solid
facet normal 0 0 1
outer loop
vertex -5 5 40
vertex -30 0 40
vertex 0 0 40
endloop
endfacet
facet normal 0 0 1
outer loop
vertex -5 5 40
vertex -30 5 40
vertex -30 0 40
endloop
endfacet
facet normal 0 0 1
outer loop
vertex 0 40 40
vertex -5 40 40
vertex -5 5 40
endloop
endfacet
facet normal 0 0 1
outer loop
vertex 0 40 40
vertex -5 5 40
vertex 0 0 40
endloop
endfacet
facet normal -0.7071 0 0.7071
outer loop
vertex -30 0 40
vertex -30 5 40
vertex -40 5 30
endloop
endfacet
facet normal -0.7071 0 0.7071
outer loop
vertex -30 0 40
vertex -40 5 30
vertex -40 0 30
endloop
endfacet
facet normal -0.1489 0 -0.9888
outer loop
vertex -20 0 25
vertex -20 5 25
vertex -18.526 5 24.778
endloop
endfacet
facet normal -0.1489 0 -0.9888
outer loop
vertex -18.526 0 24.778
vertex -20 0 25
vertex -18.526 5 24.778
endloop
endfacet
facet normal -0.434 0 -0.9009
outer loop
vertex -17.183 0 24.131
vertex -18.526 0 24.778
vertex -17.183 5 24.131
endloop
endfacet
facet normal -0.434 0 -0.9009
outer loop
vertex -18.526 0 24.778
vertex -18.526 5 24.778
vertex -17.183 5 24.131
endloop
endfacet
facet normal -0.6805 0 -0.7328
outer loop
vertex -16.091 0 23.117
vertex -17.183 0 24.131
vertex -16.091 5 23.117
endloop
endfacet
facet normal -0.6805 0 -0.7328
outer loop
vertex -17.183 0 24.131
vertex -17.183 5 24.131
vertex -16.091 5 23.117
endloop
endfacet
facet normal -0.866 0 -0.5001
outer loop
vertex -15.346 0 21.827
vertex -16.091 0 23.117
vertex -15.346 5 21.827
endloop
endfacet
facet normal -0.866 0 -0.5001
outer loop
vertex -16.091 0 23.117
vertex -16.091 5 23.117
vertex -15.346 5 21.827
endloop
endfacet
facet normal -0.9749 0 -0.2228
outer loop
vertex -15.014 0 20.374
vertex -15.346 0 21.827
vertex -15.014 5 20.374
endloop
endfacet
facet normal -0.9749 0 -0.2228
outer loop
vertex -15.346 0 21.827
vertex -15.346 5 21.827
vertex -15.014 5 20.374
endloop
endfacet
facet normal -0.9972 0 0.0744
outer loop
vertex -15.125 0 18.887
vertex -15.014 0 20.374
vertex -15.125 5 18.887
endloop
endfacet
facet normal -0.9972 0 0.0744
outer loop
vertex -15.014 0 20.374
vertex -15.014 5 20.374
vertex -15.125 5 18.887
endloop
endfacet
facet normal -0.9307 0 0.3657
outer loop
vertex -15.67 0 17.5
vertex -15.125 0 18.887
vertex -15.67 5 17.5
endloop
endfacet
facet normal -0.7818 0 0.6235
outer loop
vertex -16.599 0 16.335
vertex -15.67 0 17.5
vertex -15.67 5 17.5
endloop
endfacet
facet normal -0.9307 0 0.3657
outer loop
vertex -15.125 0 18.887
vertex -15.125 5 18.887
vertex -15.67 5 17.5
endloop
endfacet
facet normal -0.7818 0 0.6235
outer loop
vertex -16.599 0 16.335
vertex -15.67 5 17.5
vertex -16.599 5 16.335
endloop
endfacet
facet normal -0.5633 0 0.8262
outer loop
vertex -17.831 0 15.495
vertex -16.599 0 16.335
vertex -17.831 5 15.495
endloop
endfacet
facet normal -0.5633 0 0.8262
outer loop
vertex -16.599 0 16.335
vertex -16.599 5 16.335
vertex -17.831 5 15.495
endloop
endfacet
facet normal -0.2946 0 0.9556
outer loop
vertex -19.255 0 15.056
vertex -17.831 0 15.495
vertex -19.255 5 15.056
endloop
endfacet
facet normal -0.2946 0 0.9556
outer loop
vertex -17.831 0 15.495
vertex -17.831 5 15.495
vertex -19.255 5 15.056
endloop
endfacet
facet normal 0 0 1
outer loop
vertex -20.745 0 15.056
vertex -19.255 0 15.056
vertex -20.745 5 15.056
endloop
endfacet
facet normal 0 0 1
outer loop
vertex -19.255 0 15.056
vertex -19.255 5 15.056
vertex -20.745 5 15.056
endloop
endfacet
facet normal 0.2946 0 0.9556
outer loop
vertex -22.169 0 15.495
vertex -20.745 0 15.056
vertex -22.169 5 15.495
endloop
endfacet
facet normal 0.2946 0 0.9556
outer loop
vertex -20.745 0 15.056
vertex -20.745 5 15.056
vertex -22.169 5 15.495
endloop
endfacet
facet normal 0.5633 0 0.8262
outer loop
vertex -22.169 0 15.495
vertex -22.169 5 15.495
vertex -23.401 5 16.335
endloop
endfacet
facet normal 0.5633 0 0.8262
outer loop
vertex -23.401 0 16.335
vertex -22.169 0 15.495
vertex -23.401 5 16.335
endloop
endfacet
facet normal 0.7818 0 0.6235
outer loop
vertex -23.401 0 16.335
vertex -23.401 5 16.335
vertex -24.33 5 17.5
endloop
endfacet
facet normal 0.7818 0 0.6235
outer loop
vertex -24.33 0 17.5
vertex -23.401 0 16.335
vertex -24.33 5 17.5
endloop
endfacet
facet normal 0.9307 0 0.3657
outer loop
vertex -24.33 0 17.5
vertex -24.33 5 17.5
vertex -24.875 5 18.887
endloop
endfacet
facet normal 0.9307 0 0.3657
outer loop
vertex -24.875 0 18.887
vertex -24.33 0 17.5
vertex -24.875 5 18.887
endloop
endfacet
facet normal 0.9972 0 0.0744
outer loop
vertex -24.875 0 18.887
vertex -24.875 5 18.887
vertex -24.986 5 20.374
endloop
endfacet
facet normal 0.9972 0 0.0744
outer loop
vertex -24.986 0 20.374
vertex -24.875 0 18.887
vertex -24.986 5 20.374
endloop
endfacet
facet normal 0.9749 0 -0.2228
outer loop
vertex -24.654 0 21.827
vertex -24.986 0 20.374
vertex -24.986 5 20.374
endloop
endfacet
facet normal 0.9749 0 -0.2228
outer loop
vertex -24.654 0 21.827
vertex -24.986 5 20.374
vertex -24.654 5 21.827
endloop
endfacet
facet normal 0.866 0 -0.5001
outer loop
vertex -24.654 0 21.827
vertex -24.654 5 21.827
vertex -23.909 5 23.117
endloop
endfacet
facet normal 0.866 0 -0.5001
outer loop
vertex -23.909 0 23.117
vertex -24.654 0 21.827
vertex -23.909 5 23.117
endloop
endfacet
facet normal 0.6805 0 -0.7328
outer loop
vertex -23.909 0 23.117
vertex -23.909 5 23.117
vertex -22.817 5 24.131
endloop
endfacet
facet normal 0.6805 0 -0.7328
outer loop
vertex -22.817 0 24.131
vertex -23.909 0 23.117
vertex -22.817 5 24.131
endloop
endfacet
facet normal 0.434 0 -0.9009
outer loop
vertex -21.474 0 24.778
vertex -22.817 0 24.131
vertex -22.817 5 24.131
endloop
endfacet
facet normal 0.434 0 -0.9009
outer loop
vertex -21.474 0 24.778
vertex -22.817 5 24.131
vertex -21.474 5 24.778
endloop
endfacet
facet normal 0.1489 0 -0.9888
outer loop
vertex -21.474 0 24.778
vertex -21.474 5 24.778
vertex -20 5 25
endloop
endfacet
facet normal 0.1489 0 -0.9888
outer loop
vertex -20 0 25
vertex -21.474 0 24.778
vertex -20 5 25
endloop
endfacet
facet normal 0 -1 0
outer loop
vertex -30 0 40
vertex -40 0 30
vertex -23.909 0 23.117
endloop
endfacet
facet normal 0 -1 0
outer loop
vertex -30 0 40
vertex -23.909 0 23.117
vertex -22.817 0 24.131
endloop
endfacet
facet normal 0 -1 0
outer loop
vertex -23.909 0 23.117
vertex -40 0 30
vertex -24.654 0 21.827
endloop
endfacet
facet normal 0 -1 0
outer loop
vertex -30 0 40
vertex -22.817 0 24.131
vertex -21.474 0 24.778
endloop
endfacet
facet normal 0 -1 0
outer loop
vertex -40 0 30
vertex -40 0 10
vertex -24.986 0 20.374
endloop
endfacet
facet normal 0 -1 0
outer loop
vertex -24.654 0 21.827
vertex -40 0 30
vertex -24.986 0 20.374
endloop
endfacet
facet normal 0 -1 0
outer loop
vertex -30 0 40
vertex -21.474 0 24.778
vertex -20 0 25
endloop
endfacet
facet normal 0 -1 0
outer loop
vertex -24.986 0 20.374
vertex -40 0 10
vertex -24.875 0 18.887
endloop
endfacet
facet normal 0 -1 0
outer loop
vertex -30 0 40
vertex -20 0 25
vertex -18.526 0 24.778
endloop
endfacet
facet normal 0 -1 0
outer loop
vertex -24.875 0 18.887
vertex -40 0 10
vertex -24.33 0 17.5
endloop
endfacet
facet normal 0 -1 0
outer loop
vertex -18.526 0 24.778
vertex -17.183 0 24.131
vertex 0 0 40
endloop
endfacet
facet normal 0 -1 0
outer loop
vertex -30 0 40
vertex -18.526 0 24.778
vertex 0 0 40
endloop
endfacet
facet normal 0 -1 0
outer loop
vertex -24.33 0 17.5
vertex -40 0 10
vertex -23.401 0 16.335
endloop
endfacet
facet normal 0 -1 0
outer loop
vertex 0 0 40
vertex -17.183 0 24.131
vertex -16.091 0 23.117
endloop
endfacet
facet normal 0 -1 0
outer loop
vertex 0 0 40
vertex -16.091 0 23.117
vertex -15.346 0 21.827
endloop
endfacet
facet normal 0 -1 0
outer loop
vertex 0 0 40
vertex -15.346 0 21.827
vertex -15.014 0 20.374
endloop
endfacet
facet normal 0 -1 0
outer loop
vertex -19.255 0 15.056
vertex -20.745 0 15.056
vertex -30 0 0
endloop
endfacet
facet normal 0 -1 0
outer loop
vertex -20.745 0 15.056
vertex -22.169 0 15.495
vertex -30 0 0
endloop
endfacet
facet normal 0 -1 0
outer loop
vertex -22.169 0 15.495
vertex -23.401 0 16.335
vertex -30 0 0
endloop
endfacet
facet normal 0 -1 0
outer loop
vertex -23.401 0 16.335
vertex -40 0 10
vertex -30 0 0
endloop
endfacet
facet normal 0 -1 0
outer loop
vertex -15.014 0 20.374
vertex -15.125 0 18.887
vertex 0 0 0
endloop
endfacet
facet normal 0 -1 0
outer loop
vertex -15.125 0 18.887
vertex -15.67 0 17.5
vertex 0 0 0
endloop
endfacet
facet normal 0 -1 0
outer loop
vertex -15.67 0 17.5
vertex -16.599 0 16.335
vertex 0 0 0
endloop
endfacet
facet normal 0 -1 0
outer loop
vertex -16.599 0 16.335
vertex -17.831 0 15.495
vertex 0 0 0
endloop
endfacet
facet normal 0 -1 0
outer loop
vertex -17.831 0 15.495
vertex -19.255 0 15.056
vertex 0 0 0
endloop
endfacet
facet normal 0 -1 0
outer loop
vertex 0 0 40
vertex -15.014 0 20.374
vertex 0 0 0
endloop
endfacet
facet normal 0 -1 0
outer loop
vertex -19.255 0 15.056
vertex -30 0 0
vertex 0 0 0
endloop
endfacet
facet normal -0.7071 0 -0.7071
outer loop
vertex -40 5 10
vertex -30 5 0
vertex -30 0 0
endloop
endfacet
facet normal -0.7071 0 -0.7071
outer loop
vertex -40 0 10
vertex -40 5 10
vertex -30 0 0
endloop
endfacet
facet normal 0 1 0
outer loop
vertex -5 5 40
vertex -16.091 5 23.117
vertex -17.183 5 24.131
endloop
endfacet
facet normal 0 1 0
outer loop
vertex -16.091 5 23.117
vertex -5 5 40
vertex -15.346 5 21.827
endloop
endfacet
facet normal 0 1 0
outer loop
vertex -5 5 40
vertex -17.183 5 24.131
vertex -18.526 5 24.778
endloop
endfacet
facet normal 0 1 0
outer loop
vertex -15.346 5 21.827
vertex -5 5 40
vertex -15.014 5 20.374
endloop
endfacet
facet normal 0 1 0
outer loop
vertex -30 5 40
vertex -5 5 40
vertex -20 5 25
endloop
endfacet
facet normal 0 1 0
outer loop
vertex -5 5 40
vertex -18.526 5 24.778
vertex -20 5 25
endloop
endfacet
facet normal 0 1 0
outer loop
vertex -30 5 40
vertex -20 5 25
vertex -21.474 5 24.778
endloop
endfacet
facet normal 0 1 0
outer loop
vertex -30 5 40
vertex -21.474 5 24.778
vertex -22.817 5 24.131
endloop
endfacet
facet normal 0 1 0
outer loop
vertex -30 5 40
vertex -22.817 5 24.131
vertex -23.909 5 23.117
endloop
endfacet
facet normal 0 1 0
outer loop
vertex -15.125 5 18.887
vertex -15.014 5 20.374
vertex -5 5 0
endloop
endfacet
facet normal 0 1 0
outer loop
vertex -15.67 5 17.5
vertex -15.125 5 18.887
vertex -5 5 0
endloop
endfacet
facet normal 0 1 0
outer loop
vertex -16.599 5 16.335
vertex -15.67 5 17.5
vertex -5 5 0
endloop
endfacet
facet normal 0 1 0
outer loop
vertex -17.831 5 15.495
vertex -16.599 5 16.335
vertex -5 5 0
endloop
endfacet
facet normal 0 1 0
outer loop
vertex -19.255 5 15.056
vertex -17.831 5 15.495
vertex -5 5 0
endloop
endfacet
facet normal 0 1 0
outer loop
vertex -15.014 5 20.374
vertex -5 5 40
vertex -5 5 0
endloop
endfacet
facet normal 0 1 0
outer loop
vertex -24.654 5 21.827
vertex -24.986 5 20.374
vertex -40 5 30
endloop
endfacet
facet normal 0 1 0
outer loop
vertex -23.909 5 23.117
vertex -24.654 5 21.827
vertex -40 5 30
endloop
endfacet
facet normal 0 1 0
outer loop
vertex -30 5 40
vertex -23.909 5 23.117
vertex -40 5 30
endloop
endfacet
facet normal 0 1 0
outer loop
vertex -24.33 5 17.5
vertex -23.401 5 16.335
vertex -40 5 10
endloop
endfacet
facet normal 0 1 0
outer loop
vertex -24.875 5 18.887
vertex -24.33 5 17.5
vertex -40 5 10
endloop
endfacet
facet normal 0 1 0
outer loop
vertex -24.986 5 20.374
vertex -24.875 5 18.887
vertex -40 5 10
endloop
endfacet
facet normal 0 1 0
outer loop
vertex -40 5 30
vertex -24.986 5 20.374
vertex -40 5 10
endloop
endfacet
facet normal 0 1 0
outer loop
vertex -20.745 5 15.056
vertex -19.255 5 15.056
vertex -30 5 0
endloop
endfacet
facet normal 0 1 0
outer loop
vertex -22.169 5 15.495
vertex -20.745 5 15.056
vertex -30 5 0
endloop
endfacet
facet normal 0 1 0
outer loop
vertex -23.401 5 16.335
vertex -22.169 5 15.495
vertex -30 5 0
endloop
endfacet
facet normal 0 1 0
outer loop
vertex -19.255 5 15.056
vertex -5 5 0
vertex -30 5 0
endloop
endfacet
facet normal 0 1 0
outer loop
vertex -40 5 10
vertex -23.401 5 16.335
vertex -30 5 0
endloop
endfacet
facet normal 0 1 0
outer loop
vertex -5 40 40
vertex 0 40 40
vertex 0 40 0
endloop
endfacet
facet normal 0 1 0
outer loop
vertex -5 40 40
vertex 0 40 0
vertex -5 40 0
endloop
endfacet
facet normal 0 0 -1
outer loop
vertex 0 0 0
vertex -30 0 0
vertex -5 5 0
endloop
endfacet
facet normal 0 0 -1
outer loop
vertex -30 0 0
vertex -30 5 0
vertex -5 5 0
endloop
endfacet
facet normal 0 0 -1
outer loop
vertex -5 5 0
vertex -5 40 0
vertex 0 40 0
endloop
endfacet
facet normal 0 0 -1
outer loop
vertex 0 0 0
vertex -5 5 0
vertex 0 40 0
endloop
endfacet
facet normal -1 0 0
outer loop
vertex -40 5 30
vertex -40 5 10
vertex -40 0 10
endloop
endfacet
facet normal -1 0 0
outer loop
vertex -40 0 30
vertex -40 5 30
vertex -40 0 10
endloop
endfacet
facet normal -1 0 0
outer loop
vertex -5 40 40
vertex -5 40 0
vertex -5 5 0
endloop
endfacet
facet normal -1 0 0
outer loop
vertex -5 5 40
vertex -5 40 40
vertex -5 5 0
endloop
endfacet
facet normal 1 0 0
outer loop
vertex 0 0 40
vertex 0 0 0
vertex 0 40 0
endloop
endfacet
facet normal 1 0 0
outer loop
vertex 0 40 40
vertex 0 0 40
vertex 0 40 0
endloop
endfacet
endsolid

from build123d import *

# Parameters (mm, degrees)
EXTRUDE_THIN1_DEPTH = 40
CHAMFER1_SIZE       = 10
SKETCH2_R           = 5
CUT_EXTRUDE1_DEPTH  = 10


with BuildPart() as part:
    # Sketch1 → Extrude-Thin1 (new body)
    with BuildSketch(Plane.XY):
        Polygon((-40, 0), (0, 0), (0, 40), (-5, 40), (-5, 5), (-40, 5), align=None)
    extrude(amount=EXTRUDE_THIN1_DEPTH)

    # Chamfer1
    chamfer1_edges = [part.edges().sort_by_distance(p)[0] for p in [
        (-40, 2.5, 40),
        (-40, 2.5, 0),
    ]]
    chamfer(chamfer1_edges, length=CHAMFER1_SIZE)

    # Sketch2 → Cut-Extrude1 (cut)
    with BuildSketch(Plane(origin=(0, 5, 0), x_dir=(1, 0, 0), z_dir=(0, 1, 0))):
        with Locations(Location((-20, -20, 0), (0, 0, 270))):
            Circle(SKETCH2_R)
    extrude(amount=-CUT_EXTRUDE1_DEPTH, mode=Mode.SUBTRACT)


solid = part.part
